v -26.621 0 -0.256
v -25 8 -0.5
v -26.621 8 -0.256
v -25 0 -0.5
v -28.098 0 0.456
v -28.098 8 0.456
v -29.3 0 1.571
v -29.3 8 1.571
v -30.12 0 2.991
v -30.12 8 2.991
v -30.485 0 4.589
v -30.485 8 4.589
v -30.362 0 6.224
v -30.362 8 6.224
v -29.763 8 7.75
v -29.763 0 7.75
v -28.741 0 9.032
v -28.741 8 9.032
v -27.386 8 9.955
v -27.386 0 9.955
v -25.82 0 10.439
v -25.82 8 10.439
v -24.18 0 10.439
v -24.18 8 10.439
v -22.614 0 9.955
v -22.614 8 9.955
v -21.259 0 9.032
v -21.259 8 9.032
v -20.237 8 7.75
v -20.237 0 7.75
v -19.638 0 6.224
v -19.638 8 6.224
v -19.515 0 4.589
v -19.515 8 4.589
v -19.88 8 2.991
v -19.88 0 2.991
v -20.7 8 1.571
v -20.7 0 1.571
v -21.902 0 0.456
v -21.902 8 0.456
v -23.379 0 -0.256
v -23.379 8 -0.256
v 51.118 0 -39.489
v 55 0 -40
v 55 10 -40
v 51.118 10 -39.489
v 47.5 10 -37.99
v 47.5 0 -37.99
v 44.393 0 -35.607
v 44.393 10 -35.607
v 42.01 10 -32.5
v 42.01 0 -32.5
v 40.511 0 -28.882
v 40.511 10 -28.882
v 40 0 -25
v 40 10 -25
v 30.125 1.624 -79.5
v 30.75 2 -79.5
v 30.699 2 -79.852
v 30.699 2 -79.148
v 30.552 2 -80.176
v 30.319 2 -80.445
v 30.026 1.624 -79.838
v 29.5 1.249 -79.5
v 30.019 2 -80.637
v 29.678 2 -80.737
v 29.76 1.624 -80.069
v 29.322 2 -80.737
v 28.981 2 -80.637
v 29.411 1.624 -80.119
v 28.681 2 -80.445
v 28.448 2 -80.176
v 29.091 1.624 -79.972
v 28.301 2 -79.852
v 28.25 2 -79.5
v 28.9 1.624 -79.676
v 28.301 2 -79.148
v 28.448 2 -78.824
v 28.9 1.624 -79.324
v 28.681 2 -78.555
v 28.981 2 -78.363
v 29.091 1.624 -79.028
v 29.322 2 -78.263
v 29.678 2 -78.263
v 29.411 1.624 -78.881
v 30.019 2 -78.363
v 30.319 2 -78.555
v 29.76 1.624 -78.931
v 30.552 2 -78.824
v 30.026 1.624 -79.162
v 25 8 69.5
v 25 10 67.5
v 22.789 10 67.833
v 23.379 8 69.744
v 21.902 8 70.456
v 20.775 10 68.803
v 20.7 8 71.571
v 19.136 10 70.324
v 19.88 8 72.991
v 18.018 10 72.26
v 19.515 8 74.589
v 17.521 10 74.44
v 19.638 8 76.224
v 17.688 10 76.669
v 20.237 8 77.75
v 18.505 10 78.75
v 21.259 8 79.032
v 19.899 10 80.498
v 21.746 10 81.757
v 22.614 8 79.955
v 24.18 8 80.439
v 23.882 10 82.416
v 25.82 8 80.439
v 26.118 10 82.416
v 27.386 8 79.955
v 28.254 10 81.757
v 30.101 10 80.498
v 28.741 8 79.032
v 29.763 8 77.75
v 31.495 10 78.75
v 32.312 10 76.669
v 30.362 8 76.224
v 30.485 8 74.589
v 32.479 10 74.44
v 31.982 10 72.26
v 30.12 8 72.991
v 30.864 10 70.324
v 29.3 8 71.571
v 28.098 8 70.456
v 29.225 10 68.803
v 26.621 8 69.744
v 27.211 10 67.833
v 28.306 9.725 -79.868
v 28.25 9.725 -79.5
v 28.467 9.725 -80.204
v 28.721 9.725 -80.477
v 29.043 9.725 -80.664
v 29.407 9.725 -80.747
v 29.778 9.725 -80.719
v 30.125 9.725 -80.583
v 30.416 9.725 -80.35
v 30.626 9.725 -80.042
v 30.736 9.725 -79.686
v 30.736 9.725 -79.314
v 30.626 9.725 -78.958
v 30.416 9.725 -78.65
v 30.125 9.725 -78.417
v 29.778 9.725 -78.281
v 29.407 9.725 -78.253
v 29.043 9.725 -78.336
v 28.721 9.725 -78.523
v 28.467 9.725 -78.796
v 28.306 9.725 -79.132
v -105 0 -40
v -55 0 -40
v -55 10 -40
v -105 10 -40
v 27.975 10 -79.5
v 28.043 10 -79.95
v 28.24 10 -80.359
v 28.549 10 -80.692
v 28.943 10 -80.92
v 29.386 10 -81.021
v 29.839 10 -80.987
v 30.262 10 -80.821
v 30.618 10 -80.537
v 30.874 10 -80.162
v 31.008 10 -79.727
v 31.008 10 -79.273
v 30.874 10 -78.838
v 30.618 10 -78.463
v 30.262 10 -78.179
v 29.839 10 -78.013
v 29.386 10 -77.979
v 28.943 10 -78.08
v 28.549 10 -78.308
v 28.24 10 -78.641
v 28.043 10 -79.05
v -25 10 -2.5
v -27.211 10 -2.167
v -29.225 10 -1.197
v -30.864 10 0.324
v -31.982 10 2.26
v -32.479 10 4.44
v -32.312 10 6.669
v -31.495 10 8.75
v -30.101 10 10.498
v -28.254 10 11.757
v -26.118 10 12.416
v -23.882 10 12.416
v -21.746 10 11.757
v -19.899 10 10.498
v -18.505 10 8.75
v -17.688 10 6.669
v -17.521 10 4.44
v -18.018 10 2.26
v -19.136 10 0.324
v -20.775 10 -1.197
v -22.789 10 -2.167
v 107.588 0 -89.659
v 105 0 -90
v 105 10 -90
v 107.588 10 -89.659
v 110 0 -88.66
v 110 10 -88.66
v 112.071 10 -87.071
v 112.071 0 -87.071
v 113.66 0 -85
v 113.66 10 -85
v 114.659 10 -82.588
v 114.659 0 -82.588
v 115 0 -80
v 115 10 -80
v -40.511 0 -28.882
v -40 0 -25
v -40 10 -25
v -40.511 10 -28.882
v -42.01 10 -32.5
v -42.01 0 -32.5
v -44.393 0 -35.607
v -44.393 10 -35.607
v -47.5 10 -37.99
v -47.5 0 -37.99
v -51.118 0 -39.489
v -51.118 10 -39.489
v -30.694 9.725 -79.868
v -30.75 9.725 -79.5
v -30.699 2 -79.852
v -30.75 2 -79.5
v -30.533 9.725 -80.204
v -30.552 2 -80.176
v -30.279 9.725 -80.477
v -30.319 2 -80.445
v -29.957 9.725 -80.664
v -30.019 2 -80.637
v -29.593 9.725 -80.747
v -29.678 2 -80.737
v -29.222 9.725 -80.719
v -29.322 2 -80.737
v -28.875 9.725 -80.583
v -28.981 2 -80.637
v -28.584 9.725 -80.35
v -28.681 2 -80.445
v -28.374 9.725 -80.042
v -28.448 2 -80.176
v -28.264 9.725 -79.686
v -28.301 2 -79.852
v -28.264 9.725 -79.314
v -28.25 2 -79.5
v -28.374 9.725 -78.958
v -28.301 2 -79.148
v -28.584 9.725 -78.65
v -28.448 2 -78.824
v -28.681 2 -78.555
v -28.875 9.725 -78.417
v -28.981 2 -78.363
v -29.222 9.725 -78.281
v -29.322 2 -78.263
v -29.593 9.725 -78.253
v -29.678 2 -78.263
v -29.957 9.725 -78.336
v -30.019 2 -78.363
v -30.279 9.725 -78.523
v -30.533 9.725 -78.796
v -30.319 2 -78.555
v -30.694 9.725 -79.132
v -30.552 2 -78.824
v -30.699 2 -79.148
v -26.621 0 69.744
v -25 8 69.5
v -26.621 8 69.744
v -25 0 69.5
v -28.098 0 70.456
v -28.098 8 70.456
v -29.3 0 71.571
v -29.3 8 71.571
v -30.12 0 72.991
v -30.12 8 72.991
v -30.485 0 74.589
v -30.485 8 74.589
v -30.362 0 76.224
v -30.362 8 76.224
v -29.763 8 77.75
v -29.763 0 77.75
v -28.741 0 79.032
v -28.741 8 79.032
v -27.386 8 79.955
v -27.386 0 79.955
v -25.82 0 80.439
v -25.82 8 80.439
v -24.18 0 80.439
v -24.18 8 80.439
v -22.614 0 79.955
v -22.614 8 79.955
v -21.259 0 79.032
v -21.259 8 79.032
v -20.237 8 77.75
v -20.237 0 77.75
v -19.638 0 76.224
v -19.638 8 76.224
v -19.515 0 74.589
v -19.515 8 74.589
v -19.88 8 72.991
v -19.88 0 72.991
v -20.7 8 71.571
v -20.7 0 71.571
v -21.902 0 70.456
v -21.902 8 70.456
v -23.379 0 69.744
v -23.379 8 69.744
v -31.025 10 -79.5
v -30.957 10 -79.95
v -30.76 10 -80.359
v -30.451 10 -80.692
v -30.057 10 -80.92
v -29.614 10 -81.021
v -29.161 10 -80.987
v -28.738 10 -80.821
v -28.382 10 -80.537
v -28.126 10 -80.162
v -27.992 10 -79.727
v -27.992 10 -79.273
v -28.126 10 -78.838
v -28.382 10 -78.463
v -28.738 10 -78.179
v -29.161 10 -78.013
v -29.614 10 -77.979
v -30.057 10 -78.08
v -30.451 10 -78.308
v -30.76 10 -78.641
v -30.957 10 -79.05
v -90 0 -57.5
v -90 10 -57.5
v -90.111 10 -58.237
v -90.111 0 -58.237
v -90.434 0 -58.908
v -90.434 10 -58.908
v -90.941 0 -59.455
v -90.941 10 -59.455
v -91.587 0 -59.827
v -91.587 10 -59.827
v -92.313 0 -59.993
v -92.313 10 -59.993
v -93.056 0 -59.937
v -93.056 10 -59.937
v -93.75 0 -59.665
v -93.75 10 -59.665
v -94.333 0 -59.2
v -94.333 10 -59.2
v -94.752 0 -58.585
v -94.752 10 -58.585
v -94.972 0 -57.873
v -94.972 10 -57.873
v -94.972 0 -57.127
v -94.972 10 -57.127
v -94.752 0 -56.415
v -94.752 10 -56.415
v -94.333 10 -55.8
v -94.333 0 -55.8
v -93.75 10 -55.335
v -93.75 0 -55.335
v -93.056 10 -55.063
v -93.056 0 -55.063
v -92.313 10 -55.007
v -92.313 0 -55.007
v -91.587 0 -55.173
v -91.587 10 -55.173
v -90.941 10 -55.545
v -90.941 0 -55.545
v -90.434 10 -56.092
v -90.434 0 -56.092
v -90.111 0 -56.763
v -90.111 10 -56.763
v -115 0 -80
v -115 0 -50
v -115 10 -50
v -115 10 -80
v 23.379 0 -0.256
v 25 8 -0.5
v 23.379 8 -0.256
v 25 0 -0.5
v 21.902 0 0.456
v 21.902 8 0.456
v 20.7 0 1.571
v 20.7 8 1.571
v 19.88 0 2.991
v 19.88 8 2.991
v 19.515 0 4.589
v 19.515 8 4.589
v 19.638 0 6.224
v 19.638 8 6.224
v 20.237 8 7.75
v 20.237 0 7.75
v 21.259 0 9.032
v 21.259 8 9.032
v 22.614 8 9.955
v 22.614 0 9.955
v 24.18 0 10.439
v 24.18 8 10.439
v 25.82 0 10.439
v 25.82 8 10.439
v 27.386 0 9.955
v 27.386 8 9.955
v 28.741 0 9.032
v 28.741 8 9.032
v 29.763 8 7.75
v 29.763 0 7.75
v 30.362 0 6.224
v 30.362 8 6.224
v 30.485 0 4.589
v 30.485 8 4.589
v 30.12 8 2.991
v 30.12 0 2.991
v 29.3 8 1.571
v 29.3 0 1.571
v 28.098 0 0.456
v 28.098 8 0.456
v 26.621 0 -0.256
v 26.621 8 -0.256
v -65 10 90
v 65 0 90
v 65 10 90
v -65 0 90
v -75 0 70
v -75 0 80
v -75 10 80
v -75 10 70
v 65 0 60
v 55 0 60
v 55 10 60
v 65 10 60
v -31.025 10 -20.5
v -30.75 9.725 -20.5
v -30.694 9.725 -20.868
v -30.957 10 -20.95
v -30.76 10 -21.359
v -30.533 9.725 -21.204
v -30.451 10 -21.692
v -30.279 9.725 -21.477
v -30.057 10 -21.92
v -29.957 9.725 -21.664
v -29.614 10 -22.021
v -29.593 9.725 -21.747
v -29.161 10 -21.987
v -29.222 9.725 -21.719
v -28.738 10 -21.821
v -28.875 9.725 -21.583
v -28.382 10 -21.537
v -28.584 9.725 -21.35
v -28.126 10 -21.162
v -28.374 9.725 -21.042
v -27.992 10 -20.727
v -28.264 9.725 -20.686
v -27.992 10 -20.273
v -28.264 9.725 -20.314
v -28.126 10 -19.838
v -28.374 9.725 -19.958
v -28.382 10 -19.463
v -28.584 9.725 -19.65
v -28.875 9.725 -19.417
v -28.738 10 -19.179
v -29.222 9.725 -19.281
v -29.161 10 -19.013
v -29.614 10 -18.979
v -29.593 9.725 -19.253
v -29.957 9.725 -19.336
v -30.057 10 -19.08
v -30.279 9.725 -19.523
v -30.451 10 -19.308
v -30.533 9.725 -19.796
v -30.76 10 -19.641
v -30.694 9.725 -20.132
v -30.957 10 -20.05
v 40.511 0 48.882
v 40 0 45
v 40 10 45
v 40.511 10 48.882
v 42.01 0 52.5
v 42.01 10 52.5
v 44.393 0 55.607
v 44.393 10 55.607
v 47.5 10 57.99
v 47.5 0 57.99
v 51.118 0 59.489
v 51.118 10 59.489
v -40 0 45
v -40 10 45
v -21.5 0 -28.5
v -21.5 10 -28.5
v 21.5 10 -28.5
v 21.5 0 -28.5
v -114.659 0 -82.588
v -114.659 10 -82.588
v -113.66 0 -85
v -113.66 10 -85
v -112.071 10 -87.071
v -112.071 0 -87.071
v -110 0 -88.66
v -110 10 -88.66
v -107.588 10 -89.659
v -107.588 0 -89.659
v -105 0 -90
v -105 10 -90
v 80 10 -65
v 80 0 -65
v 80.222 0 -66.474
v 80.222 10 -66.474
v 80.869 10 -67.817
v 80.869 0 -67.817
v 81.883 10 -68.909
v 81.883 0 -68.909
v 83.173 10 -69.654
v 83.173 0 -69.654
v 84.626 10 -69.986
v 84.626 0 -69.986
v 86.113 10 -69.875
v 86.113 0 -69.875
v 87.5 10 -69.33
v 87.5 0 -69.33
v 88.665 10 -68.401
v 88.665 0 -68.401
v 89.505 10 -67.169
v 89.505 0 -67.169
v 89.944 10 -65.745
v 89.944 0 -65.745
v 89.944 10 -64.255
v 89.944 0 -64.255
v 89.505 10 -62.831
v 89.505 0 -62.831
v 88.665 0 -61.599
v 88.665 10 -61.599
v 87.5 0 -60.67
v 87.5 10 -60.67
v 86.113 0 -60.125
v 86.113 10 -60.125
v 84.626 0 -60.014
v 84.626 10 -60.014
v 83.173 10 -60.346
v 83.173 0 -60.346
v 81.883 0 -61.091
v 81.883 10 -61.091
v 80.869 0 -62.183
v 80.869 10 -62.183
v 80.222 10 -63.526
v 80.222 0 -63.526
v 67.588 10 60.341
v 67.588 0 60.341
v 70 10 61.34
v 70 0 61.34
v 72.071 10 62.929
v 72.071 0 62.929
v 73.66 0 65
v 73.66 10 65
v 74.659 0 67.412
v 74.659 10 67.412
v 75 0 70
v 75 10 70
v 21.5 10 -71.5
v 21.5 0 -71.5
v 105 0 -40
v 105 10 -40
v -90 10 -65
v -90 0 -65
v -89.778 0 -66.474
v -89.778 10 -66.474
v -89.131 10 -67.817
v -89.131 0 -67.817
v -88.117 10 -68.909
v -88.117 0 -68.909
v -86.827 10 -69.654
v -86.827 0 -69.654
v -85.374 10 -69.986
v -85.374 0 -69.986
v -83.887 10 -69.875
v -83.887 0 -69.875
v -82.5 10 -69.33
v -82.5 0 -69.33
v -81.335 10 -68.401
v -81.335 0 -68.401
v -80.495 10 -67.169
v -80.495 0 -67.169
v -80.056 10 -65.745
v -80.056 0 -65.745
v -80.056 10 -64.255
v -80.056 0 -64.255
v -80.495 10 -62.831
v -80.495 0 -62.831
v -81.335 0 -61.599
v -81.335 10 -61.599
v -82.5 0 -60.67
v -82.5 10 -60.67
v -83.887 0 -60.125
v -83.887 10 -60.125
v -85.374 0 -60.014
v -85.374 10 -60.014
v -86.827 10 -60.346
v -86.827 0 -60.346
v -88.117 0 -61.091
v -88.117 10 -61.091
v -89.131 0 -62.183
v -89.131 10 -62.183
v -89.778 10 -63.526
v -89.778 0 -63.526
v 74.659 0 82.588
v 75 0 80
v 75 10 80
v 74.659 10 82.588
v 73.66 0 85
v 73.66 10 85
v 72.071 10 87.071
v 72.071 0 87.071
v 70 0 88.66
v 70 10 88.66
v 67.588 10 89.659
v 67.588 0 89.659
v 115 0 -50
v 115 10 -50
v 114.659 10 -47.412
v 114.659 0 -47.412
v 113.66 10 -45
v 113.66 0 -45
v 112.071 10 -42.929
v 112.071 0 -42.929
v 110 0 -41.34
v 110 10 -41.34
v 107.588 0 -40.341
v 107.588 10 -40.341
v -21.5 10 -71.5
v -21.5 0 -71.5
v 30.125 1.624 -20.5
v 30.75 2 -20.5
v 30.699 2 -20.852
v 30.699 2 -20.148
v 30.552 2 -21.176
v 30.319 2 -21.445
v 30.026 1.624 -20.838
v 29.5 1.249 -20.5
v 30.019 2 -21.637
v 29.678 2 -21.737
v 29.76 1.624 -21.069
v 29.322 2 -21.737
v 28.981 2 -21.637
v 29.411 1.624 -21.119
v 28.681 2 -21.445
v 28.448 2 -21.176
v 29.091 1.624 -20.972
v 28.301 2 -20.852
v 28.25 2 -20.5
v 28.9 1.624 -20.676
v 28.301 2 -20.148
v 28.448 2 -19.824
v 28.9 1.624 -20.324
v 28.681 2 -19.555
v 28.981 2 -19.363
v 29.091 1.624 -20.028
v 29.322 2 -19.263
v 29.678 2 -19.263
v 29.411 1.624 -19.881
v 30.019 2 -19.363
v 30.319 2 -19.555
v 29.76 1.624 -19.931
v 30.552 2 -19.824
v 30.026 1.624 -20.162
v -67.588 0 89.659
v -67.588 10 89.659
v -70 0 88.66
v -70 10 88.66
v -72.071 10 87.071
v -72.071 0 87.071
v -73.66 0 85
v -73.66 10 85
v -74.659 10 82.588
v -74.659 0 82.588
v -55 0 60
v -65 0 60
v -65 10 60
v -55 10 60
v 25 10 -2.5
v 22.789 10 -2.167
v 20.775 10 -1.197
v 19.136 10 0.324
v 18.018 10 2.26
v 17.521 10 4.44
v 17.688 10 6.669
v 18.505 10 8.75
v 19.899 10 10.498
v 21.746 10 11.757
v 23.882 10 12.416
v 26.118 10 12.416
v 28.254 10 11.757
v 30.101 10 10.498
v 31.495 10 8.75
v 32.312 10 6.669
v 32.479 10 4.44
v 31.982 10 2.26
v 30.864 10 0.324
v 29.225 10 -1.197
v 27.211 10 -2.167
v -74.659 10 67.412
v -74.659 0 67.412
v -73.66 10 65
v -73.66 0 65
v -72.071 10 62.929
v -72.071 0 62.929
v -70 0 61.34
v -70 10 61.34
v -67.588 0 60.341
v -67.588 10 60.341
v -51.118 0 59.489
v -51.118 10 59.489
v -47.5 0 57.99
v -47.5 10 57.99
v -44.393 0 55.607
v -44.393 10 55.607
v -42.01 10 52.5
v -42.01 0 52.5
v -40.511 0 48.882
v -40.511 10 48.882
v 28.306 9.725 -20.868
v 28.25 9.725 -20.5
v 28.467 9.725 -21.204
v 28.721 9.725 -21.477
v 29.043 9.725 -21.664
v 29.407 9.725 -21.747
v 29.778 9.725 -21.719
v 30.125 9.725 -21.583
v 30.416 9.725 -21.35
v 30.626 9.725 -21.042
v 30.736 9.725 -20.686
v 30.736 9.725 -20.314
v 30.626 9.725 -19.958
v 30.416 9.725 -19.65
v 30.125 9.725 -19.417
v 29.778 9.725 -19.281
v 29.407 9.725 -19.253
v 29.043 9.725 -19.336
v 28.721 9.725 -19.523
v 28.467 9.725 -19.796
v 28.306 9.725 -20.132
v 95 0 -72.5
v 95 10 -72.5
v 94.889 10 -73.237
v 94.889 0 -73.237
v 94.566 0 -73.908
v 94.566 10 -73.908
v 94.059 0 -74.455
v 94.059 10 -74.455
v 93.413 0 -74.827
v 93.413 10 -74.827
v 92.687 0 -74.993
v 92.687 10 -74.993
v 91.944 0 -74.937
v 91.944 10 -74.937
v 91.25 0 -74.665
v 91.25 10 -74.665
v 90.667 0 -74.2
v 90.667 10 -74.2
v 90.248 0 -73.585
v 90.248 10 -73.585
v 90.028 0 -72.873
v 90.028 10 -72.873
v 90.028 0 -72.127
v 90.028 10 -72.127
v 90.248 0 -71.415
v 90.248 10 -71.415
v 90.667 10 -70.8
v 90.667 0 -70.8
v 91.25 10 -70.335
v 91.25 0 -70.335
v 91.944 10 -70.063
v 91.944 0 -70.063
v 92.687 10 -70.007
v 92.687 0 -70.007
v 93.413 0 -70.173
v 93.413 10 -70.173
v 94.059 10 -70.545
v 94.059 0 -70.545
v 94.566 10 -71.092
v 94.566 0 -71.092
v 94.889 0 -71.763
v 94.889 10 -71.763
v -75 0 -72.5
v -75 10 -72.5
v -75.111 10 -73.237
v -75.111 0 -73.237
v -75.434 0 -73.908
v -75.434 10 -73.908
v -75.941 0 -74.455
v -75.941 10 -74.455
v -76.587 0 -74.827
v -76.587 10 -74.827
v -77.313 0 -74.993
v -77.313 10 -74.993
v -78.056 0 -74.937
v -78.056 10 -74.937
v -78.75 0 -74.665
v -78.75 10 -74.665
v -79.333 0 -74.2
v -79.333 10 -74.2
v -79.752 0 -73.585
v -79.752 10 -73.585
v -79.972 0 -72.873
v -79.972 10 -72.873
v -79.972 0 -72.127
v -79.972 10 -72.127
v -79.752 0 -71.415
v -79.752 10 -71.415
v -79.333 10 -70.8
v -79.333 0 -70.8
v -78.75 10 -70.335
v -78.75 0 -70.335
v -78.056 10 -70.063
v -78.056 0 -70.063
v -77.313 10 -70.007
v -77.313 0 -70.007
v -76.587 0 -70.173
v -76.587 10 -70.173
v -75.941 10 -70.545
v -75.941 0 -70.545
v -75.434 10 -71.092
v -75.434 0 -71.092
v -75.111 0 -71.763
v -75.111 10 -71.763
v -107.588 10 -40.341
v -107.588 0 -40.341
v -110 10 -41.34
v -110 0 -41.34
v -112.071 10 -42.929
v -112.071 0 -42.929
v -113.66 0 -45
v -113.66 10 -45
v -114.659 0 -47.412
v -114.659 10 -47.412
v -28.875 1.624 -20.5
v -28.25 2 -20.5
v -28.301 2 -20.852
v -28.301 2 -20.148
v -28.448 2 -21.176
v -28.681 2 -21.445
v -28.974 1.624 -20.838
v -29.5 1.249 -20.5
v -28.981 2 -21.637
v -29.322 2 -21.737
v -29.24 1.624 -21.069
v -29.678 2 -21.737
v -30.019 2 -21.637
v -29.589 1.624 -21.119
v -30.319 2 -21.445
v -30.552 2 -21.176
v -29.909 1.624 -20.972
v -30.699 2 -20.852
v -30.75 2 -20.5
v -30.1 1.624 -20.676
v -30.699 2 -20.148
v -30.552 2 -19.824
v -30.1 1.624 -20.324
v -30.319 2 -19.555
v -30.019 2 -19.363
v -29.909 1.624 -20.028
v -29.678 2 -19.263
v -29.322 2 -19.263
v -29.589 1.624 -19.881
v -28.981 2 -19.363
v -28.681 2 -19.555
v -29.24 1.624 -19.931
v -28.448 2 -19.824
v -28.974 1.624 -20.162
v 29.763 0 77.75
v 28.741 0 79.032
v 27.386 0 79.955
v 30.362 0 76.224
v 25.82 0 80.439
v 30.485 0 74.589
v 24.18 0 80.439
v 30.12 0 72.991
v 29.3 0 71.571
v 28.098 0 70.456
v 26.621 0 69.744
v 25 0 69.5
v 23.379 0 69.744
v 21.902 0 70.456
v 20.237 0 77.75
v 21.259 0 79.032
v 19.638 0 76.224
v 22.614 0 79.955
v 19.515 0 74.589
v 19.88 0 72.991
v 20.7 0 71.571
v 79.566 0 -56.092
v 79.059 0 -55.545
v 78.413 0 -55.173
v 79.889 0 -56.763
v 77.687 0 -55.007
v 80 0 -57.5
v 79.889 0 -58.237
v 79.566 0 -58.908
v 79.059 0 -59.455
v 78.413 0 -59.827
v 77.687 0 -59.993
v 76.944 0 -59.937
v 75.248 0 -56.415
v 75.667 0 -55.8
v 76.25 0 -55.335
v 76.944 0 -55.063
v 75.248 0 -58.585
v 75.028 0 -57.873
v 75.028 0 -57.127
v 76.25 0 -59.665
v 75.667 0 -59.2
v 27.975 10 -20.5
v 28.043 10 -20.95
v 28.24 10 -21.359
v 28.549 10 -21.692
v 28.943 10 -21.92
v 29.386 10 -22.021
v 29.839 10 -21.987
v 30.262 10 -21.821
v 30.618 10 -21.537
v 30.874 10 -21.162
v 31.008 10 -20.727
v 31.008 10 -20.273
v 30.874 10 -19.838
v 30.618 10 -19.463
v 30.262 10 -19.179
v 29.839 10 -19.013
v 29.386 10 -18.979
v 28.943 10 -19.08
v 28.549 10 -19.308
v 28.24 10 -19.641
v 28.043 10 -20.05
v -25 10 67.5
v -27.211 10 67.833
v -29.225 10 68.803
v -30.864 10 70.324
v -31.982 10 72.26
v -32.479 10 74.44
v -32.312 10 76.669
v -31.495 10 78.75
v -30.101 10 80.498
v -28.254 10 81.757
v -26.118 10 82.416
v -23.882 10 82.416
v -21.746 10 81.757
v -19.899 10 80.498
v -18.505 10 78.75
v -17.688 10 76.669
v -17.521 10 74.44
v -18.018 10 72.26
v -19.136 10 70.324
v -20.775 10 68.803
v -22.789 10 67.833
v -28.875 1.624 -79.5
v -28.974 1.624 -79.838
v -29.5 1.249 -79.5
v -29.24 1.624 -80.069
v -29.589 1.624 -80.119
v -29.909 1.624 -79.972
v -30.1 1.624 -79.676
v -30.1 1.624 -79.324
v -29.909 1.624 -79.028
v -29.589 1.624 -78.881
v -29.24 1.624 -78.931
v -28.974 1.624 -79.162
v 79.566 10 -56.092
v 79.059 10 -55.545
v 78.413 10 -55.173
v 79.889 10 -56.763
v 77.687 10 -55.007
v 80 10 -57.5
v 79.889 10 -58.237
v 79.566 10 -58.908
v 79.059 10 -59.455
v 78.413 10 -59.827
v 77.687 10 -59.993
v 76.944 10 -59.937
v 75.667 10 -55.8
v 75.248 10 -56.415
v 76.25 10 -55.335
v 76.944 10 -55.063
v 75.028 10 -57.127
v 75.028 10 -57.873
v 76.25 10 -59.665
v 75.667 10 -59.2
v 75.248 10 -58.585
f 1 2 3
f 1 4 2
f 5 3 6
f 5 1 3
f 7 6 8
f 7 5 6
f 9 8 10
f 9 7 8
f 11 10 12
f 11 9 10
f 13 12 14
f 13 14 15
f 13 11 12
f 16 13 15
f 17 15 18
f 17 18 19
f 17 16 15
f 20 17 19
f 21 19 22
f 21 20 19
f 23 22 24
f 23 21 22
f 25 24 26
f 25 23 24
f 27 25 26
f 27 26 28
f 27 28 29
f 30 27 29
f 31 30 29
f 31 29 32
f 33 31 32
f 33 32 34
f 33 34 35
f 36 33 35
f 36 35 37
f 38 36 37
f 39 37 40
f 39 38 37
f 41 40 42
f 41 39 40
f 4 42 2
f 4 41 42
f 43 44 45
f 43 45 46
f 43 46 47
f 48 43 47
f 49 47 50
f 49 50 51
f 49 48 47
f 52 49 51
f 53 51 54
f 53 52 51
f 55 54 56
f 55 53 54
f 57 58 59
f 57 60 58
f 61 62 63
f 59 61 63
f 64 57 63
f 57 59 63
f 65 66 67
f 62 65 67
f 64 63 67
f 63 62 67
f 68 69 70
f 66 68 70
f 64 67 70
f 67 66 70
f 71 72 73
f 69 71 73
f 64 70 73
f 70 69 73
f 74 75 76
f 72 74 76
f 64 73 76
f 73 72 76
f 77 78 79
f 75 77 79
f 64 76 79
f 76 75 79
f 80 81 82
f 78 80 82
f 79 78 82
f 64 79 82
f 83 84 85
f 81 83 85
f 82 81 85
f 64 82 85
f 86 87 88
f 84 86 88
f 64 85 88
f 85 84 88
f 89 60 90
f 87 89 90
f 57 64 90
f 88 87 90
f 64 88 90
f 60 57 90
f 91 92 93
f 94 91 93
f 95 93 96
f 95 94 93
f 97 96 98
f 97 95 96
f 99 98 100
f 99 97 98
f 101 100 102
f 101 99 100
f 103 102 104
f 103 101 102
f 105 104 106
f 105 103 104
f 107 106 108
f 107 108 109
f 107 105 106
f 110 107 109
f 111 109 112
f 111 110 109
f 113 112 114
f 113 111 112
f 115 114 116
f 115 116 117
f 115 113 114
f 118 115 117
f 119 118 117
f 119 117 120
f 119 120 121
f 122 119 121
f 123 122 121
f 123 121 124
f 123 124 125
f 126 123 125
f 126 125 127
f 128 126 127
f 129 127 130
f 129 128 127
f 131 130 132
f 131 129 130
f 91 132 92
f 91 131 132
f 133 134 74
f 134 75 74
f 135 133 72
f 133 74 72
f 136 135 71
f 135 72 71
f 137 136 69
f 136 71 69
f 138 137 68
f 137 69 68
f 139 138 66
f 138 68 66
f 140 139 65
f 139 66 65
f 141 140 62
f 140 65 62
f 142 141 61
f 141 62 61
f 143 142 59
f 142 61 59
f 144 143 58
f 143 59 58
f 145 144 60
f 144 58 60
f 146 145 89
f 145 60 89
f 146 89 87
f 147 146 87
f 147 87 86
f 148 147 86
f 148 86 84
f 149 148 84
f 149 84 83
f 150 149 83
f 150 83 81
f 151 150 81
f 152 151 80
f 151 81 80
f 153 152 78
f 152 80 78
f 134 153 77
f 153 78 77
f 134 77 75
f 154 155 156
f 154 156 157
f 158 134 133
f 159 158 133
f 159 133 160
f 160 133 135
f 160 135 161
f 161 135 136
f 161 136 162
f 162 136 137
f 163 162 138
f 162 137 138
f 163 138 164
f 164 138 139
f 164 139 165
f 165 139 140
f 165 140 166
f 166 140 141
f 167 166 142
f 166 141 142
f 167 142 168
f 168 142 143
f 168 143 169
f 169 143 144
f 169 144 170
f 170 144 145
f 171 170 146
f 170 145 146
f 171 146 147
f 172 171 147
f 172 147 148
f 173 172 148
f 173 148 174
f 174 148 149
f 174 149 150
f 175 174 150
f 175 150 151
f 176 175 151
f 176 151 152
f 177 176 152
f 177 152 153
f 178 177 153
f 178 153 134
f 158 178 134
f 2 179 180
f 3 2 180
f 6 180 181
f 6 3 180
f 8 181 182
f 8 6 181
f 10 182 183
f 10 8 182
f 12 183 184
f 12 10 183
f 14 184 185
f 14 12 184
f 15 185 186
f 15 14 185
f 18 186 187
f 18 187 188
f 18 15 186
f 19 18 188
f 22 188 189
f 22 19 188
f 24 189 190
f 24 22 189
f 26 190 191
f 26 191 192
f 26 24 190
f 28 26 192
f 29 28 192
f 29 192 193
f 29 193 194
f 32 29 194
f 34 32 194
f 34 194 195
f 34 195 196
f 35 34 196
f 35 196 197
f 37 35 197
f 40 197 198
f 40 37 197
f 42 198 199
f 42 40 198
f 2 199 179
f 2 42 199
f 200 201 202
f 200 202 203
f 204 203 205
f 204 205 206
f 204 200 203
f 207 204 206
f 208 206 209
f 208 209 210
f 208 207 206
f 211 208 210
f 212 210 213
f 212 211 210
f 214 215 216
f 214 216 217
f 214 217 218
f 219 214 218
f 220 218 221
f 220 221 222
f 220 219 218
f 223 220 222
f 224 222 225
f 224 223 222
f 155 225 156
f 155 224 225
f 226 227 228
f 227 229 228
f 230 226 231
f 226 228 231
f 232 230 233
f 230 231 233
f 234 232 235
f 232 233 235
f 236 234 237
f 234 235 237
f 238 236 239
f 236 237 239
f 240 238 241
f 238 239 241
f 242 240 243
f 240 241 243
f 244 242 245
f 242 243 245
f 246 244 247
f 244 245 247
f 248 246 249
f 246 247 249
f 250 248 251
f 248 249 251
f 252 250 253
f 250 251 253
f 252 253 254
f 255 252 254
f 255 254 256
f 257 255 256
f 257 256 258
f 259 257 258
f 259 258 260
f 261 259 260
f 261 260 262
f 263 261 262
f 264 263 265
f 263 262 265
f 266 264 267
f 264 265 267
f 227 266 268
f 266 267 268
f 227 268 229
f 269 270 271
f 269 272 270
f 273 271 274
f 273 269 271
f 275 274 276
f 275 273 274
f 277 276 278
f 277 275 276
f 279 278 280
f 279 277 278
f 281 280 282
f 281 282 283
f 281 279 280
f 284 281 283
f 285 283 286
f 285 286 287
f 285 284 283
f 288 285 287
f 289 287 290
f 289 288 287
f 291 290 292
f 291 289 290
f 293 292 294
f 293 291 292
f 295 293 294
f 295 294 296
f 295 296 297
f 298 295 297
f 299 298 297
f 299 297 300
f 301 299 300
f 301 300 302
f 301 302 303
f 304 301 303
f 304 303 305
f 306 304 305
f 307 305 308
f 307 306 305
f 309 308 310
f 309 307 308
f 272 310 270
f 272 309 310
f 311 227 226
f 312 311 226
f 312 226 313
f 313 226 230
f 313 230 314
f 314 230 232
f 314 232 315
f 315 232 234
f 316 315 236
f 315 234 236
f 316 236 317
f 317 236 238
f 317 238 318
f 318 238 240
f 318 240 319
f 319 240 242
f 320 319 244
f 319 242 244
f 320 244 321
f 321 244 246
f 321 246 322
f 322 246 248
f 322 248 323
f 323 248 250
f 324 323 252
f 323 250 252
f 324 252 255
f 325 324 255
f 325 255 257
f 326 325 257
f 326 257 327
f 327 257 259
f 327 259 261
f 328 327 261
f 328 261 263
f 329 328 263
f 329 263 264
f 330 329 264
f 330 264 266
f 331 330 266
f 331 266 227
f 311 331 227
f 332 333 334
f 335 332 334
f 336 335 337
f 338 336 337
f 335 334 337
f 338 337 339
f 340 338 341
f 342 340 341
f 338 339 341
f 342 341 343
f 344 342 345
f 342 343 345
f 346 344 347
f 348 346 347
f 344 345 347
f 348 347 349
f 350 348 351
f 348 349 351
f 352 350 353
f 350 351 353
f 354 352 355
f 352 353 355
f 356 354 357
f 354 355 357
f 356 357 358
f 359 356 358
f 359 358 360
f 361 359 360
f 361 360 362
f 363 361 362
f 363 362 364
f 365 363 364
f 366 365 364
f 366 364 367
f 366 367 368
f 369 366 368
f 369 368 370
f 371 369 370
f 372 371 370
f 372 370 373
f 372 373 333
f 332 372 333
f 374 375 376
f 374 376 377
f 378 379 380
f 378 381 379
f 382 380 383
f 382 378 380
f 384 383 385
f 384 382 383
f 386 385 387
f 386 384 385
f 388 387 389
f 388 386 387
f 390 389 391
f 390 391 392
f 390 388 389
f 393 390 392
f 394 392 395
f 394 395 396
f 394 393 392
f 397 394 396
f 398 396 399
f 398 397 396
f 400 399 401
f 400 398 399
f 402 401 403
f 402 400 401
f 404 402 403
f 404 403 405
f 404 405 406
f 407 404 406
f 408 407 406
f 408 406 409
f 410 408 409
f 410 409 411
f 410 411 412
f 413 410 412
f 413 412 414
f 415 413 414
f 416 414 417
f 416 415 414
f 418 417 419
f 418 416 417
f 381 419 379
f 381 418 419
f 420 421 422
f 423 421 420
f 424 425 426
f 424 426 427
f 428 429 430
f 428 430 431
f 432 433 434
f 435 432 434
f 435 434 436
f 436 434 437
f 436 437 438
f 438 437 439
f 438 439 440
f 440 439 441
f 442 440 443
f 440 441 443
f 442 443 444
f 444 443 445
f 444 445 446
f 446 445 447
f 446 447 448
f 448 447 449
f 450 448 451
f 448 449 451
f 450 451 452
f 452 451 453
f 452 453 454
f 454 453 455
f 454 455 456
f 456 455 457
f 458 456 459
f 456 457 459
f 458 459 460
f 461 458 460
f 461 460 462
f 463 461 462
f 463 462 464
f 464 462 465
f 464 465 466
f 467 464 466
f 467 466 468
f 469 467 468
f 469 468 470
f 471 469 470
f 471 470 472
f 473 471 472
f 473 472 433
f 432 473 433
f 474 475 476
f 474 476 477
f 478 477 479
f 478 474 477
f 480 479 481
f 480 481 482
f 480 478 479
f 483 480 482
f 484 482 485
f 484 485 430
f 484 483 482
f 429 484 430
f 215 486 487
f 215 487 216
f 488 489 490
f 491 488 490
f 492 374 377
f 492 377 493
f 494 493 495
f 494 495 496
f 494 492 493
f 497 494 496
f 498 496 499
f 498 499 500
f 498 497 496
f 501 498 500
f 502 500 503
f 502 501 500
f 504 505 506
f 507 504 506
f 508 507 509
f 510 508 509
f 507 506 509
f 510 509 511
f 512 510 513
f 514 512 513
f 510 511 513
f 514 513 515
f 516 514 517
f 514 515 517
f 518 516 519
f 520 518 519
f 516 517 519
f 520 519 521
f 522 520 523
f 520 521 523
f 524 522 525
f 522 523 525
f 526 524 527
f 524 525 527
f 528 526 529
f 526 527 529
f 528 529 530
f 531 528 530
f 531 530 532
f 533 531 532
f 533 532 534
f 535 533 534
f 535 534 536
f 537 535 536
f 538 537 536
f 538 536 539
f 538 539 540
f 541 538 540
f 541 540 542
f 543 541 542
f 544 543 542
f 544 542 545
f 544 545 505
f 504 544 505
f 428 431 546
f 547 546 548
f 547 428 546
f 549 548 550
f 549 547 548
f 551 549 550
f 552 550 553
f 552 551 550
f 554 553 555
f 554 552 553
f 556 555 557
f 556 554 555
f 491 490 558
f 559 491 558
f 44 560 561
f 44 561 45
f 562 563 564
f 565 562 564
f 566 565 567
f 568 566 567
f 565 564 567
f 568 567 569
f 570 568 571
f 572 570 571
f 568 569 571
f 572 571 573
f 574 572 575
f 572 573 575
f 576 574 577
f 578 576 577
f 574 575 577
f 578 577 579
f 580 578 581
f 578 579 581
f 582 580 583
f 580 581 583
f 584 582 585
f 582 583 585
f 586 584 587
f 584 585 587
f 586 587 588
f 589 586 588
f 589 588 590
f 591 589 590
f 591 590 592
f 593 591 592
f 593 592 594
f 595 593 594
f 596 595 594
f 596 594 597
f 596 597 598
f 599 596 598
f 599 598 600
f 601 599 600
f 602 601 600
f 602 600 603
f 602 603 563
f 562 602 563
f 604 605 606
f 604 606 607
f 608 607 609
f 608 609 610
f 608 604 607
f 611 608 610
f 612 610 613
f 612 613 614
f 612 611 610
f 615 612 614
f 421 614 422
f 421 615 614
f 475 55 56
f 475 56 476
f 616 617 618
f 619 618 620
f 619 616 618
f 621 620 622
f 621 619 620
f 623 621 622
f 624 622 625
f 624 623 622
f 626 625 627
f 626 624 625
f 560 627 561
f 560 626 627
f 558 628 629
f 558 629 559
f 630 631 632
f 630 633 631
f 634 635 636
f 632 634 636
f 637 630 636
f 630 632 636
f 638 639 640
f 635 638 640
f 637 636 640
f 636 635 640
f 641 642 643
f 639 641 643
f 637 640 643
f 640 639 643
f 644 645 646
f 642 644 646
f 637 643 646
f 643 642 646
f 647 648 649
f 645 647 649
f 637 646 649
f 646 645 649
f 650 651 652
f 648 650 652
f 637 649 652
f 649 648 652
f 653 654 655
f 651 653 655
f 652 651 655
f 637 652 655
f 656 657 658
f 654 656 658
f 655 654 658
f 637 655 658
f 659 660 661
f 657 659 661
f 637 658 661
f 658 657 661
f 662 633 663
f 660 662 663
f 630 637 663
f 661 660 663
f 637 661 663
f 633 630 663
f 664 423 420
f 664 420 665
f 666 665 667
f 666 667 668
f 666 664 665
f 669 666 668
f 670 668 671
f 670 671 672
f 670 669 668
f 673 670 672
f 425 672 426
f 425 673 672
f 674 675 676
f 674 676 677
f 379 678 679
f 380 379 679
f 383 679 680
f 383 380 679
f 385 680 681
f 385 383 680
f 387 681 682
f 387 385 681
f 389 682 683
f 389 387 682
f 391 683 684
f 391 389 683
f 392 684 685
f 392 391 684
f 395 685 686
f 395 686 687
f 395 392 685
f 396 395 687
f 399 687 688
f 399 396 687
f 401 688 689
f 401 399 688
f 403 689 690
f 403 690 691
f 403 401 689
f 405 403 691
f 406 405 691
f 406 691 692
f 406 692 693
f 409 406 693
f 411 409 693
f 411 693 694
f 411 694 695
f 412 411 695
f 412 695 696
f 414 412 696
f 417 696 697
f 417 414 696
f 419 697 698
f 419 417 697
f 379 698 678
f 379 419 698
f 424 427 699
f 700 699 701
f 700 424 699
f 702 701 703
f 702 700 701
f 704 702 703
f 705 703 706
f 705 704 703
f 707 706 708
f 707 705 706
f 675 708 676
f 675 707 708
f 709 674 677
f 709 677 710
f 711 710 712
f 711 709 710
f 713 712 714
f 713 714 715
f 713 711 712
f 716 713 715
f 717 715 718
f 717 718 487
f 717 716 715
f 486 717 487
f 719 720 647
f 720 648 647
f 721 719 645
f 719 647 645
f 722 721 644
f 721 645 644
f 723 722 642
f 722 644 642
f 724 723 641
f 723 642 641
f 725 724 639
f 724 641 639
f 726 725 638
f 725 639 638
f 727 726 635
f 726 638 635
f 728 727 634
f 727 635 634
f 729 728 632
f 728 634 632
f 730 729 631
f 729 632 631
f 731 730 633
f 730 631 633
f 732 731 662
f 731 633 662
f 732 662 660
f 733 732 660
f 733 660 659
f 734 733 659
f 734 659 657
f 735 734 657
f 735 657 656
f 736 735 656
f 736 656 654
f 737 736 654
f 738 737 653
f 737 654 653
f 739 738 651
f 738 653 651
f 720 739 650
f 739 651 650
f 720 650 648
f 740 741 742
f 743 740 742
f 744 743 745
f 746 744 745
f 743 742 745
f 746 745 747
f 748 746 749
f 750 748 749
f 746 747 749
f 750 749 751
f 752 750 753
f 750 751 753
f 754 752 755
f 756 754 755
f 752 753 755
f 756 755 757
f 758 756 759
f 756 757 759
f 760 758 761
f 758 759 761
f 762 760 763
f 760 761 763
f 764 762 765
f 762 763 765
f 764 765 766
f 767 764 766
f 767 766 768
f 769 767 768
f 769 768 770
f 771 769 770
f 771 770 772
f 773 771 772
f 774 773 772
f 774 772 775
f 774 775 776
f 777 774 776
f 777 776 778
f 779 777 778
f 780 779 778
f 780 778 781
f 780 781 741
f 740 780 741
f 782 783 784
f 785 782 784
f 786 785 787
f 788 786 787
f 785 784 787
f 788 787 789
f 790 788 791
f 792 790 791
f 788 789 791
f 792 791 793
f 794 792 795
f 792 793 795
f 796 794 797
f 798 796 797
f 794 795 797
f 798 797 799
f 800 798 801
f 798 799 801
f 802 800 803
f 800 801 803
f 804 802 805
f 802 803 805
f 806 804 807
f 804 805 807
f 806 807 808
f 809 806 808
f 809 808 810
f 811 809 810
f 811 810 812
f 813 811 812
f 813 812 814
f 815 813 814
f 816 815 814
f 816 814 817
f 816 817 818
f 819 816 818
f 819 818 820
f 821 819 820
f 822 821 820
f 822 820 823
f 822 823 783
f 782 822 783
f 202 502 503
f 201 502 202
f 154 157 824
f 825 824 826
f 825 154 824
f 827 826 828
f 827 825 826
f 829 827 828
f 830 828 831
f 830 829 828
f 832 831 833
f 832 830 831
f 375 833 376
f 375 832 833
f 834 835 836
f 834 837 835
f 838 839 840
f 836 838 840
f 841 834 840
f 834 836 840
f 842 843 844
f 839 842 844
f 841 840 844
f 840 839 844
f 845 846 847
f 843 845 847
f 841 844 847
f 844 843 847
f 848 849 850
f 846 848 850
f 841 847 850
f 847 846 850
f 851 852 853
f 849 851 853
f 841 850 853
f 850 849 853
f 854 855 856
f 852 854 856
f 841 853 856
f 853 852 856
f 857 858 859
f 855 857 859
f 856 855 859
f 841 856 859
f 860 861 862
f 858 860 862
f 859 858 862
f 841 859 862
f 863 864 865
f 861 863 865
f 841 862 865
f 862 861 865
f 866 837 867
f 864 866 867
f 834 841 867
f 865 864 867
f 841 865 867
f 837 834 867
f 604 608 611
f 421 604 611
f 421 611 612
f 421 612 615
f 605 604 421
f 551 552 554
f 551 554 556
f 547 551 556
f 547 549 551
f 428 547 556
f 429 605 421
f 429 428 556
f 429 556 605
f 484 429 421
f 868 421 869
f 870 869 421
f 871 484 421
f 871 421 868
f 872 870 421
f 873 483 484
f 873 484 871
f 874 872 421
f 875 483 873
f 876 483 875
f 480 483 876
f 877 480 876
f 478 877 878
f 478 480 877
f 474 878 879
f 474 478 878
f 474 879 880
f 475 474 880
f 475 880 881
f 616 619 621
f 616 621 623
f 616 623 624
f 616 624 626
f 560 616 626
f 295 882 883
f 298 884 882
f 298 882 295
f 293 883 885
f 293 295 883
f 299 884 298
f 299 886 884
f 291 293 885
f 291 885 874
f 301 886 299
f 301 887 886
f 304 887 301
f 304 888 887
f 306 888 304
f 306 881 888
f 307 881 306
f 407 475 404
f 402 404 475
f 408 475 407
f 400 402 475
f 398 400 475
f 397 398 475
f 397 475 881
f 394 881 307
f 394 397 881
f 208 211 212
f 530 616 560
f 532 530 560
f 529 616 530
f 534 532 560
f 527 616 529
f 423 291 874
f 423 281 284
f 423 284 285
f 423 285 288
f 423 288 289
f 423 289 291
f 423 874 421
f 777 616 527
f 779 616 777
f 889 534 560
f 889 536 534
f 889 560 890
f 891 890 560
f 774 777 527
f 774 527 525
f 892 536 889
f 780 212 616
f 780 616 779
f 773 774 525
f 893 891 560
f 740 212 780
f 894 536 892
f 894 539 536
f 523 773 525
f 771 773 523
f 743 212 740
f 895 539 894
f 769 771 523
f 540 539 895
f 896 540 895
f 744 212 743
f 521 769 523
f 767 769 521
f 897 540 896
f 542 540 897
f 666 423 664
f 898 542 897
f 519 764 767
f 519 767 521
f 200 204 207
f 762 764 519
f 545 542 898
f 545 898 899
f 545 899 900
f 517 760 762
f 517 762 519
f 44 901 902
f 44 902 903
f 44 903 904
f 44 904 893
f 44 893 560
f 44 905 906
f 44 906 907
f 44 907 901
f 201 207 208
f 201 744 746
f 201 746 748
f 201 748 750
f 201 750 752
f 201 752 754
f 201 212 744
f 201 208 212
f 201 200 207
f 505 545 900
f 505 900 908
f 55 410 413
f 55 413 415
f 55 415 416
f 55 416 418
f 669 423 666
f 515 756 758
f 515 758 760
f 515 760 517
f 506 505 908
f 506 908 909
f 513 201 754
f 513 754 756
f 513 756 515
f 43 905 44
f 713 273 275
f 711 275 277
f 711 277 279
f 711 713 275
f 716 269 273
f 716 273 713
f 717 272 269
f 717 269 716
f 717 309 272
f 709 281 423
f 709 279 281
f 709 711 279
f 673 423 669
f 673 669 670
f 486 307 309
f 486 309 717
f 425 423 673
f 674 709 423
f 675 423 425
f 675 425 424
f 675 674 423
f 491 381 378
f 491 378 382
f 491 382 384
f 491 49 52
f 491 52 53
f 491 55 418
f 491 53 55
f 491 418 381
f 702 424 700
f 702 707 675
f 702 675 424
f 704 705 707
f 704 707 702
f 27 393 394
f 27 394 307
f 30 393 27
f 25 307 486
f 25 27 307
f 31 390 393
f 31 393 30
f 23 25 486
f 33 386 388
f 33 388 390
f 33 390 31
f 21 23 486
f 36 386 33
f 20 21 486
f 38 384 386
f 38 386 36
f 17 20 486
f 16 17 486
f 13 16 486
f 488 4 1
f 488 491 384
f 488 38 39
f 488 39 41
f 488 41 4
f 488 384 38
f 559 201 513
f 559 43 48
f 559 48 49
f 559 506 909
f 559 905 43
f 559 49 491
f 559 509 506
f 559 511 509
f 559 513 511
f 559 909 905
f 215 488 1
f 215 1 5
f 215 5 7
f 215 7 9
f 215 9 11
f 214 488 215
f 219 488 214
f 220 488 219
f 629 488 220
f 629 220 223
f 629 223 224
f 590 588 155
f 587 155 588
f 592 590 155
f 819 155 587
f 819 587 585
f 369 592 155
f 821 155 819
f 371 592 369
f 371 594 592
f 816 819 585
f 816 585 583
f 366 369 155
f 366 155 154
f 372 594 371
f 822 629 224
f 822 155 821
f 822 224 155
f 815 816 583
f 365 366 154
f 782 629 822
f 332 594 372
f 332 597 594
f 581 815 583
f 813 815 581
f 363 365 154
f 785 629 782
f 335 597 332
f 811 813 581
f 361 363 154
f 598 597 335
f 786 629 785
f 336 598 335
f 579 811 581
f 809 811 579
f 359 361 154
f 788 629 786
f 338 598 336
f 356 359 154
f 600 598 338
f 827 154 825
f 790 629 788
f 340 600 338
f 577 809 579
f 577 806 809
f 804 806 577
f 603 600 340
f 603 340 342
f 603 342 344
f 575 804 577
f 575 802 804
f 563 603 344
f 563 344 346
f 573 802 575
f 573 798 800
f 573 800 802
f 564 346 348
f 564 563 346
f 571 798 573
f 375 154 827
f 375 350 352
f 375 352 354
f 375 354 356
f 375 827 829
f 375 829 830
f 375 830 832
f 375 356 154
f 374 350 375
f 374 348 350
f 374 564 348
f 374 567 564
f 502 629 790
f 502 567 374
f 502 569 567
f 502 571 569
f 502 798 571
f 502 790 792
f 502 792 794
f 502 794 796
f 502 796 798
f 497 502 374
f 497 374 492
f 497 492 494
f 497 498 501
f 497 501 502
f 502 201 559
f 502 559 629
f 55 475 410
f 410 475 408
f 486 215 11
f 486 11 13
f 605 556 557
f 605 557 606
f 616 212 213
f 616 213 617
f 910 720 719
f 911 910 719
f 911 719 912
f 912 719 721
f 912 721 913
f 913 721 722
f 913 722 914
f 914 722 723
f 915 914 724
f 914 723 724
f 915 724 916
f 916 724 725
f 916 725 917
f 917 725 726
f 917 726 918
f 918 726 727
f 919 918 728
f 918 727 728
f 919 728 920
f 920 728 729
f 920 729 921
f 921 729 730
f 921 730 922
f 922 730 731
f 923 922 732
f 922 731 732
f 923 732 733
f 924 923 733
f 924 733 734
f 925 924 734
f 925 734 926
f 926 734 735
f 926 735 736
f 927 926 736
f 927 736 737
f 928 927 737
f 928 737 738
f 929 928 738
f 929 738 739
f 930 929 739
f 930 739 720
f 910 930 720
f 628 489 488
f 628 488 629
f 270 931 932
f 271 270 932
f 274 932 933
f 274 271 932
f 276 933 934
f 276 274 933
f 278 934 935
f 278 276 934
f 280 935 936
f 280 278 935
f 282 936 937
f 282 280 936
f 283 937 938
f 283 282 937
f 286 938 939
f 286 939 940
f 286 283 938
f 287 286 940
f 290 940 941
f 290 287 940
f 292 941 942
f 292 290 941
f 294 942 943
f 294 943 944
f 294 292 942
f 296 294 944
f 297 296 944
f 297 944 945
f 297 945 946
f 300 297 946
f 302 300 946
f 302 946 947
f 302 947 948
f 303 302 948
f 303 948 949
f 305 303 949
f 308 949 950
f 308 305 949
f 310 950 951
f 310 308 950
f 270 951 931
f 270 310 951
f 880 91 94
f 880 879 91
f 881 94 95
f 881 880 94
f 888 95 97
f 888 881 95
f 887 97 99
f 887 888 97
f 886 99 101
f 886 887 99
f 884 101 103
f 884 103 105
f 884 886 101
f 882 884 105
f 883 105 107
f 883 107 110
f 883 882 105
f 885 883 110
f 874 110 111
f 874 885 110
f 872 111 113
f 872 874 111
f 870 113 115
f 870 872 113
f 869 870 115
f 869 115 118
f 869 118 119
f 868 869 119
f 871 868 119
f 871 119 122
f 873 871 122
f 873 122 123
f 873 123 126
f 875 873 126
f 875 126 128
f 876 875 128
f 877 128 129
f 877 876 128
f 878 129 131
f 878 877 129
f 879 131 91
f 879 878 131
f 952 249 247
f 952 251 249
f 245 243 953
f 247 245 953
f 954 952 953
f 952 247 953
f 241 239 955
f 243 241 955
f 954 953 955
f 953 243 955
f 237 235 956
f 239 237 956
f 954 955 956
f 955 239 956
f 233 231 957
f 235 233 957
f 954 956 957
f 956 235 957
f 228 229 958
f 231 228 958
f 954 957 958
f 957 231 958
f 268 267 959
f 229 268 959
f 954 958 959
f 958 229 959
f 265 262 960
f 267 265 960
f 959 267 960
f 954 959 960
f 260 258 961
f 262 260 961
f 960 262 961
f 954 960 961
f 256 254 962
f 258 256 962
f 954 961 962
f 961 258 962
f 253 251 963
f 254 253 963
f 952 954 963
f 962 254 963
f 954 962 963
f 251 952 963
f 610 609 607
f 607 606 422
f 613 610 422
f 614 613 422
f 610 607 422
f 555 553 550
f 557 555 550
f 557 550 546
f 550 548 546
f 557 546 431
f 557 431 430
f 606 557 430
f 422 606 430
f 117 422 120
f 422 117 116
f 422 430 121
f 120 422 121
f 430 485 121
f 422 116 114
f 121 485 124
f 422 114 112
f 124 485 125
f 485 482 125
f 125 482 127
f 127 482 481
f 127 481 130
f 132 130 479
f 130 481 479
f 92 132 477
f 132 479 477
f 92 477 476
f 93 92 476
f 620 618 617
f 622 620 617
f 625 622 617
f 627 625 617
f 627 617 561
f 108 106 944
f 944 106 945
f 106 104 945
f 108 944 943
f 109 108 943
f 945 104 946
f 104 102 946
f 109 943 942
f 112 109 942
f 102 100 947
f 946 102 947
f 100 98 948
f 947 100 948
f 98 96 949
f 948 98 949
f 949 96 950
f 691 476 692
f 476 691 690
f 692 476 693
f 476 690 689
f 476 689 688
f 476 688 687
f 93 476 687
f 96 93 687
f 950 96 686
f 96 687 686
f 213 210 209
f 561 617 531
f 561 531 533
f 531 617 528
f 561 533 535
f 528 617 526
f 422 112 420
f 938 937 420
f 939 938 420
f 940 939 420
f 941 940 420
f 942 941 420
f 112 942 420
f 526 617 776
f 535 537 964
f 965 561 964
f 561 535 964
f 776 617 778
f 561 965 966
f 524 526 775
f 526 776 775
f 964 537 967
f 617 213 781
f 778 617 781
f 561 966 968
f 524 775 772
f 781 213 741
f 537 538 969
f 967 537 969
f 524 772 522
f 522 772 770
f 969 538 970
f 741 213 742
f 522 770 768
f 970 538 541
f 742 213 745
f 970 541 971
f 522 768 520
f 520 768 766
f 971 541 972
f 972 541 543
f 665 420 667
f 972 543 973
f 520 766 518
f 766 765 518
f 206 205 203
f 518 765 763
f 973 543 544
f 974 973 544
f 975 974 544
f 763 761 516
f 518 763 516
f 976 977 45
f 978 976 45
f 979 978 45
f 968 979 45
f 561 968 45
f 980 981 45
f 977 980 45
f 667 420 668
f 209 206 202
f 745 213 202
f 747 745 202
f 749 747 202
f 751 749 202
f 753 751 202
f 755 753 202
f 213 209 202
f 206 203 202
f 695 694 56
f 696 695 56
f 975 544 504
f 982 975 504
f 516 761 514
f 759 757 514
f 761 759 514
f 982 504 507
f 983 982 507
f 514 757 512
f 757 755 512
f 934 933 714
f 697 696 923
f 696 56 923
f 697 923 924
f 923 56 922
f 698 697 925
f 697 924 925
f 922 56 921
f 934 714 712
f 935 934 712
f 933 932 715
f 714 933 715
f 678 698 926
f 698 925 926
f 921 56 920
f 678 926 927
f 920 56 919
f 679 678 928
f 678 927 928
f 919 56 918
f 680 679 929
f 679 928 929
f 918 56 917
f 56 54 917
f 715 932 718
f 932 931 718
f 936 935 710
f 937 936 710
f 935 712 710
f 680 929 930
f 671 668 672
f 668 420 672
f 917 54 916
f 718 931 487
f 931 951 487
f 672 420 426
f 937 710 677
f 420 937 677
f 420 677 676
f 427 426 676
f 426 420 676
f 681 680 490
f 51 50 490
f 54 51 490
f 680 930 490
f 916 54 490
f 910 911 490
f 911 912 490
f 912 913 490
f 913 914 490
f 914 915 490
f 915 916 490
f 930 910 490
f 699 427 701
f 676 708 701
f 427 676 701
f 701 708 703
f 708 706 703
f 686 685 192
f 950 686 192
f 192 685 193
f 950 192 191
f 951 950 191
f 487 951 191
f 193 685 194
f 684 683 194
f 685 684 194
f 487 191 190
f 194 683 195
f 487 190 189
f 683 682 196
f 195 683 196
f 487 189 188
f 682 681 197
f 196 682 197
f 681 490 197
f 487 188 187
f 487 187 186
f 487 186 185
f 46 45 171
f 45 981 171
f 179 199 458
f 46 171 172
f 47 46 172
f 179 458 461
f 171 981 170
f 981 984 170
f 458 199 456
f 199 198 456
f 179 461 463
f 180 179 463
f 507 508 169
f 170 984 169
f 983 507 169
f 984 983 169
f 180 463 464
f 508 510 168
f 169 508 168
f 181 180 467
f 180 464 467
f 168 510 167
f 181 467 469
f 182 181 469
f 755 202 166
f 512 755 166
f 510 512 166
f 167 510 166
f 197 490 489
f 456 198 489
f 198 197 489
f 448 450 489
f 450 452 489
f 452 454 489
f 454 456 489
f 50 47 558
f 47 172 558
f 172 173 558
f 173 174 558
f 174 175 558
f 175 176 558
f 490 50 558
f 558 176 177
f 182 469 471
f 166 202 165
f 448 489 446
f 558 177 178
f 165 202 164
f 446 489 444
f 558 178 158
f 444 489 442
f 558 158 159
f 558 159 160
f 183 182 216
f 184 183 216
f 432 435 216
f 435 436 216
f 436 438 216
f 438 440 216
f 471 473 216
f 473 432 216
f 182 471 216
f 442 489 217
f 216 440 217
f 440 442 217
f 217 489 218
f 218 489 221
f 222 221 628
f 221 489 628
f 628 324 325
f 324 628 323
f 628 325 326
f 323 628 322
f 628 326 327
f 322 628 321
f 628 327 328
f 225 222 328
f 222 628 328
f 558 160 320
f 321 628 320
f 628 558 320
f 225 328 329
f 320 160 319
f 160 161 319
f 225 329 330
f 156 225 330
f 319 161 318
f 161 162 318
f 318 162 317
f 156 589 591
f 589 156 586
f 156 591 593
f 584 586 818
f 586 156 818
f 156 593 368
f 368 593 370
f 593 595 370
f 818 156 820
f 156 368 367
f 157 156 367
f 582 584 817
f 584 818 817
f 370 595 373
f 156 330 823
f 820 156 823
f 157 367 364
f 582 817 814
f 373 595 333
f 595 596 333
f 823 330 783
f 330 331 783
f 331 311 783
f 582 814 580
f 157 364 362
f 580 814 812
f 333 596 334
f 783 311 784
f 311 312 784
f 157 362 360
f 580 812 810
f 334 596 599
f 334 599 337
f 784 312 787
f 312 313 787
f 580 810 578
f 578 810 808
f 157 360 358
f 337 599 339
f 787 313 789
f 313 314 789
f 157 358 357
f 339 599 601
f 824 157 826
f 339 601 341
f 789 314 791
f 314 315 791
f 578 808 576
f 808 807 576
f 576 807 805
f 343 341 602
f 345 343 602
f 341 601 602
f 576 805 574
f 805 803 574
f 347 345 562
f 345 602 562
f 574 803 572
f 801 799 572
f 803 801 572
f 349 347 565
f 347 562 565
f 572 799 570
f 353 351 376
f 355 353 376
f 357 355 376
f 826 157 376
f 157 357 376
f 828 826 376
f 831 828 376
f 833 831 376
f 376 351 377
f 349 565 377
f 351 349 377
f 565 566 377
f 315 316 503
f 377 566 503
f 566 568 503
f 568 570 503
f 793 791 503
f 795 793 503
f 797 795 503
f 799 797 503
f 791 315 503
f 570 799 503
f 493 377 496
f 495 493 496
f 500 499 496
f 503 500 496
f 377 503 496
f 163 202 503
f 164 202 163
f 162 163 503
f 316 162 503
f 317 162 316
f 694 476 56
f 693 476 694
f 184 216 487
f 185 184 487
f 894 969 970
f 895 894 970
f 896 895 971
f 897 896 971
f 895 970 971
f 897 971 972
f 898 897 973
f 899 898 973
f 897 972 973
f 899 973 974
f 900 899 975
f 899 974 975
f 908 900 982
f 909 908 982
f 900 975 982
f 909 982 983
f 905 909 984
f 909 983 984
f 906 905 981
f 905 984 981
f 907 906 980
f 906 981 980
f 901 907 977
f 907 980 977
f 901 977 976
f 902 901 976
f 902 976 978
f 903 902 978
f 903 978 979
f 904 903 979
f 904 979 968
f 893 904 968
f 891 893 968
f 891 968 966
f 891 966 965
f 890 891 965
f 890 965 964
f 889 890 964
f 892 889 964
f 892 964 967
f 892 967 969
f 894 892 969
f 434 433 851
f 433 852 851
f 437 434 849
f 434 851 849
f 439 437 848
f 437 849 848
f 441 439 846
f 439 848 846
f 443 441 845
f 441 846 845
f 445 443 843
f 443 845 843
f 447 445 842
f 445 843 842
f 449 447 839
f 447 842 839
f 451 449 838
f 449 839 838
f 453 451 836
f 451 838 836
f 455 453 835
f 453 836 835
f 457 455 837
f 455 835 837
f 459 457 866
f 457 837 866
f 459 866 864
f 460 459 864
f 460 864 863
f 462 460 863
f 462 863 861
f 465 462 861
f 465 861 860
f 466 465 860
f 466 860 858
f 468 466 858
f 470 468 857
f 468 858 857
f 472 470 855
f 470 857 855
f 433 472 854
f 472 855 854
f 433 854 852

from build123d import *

# Parameters (mm, degrees)
AUFSATZ_LINEAR_AUSTRAGEN1_DEPTH    = 10
F_10_0_10_DURCHMESSER_BOHRUNG1_D   = 10
SKIZZE8_W                          = 43
SKIZZE8_H                          = 43
SCHNITT_LINEAR_AUSTRAGEN2_DEPTH    = 10
M3_GEWINDEBOHRUNG1_D               = 2.5
M3_GEWINDEBOHRUNG1_DEPTH           = 8
M3_GEWINDEBOHRUNG1_CSINK_D         = 3.05
M3_GEWINDEBOHRUNG1_CSINK_ANGLE     = 90
M3_GEWINDEBOHRUNG1_TIP             = 0.751075774
F_5_0_5_DURCHMESSER_BOHRUNG1_D     = 5
DURCHGANGSLOCH_F_R_M101_AT_2_COUNT = 2
DURCHGANGSLOCH_F_R_M101_AT_2_PITCH = 70
DURCHGANGSLOCH_F_R_M101_AT_3_COUNT = 2
DURCHGANGSLOCH_F_R_M101_AT_3_PITCH = 50
DURCHGANGSLOCH_F_R_M101_AT_4_COUNT = 2
DURCHGANGSLOCH_F_R_M101_AT_4_PITCH = 86.02325267


with BuildPart() as part:
    # Skizze1 → Aufsatz-Linear austragen1 (new body)
    with BuildSketch(Plane(origin=(0, 0, 0), x_dir=(1, 0, 0), z_dir=(0, 1, 0))):
        with BuildLine():
            Line((-105, 90), (105, 90))
            ThreePointArc((105, 90), (112.071067812, 87.071067812), (115, 80))
            Line((115, 80), (115, 50))
            ThreePointArc((115, 50), (112.071067812, 42.928932188), (105, 40))
            Line((105, 40), (55, 40))
            ThreePointArc((55, 40), (44.393398282, 35.606601718), (40, 25))
            Line((40, 25), (40, -45))
            ThreePointArc((40, -45), (44.393398282, -55.606601718), (55, -60))
            Line((55, -60), (65, -60))
            ThreePointArc((65, -60), (72.071067812, -62.928932188), (75, -70))
            Line((75, -70), (75, -80))
            ThreePointArc((75, -80), (72.071067812, -87.071067812), (65, -90))
            Line((65, -90), (-65, -90))
            ThreePointArc((-65, -90), (-72.071067812, -87.071067812), (-75, -80))
            Line((-75, -80), (-75, -70))
            ThreePointArc((-75, -70), (-72.071067812, -62.928932188), (-65, -60))
            Line((-65, -60), (-55, -60))
            ThreePointArc((-55, -60), (-44.393398282, -55.606601718), (-40, -45))
            Line((-40, -45), (-40, 25))
            ThreePointArc((-40, 25), (-44.393398282, 35.606601718), (-55, 40))
            Line((-55, 40), (-105, 40))
            ThreePointArc((-105, 40), (-112.071067812, 42.928932188), (-115, 50))
            Line((-115, 50), (-115, 80))
            ThreePointArc((-115, 80), (-112.071067812, 87.071067812), (-105, 90))
        make_face()
    extrude(amount=AUFSATZ_LINEAR_AUSTRAGEN1_DEPTH)

    # Ø10.0 (10) Durchmesser Bohrung1 (through all)
    with Locations(Plane(origin=(0, 10, 0), x_dir=(1, 0, 0), z_dir=(0, 1, 0))):
        with Locations((-85, 65), (85, 65)):
            Hole(F_10_0_10_DURCHMESSER_BOHRUNG1_D / 2)

    # Skizze8 → Schnitt-Linear austragen2 (cut)
    with BuildSketch(Plane(origin=(0, 10, 0), x_dir=(1, 0, 0), z_dir=(0, 1, 0))):
        with Locations((0, 50)):
            Rectangle(SKIZZE8_W, SKIZZE8_H)
    extrude(amount=-SCHNITT_LINEAR_AUSTRAGEN2_DEPTH, mode=Mode.SUBTRACT)

    # M3 Gewindebohrung1
    with Locations(Plane(origin=(0, 10, 0), x_dir=(1, 0, 0), z_dir=(0, 1, 0))):
        with Locations((-29.5, 79.5), (-29.5, 20.5), (29.5, 20.5), (29.5, 79.5)):
            CounterSinkHole(M3_GEWINDEBOHRUNG1_D / 2, M3_GEWINDEBOHRUNG1_CSINK_D / 2, depth=M3_GEWINDEBOHRUNG1_DEPTH, counter_sink_angle=M3_GEWINDEBOHRUNG1_CSINK_ANGLE)
            with Locations((0, 0, -(M3_GEWINDEBOHRUNG1_DEPTH + M3_GEWINDEBOHRUNG1_TIP / 2))):  # 118° drill point
                Cone(0, M3_GEWINDEBOHRUNG1_D / 2, M3_GEWINDEBOHRUNG1_TIP, mode=Mode.SUBTRACT)

    # Ø5.0 (5) Durchmesser Bohrung1 (through all)
    with Locations(Plane(origin=(0, 0, 0), x_dir=(-1, 0, 0), z_dir=(0, -1, 0))):
        with Locations((77.5, 72.5), (92.5, 57.5), (-92.5, 72.5), (-77.5, 57.5)):
            Hole(F_5_0_5_DURCHMESSER_BOHRUNG1_D / 2)

    # Skizze14 → Durchgangsloch für M101 (revolve, cut)
    with BuildSketch(Plane(origin=(25, 0, 5), x_dir=(0, 0, -1), z_dir=(1, 0, 0))):
        Polygon((0, 0), (0, 10), (7.5, 10), (5.5, 8), (5.5, 0), align=None)
    durchgangsloch_f_r_m101 = revolve(axis=Axis((25, -6.35, 5), (0, 1, 0)), mode=Mode.SUBTRACT)

    # Durchgangsloch für M101 at 2: Durchgangsloch für M101 ×2
    with Locations(*[(0, 0, i * DURCHGANGSLOCH_F_R_M101_AT_2_PITCH) for i in range(1, DURCHGANGSLOCH_F_R_M101_AT_2_COUNT)]):
        add(durchgangsloch_f_r_m101, mode=Mode.SUBTRACT)

    # Durchgangsloch für M101 at 3: Durchgangsloch für M101 ×2
    with Locations(*[(-i * DURCHGANGSLOCH_F_R_M101_AT_3_PITCH, 0, 0) for i in range(1, DURCHGANGSLOCH_F_R_M101_AT_3_COUNT)]):
        add(durchgangsloch_f_r_m101, mode=Mode.SUBTRACT)

    # Durchgangsloch für M101 at 4: Durchgangsloch für M101 ×2
    with Locations(*[Vector(-0.5812381937190965, 0, 0.813733471206735) * (i * DURCHGANGSLOCH_F_R_M101_AT_4_PITCH) for i in range(1, DURCHGANGSLOCH_F_R_M101_AT_4_COUNT)]):
        add(durchgangsloch_f_r_m101, mode=Mode.SUBTRACT)


solid = part.part
